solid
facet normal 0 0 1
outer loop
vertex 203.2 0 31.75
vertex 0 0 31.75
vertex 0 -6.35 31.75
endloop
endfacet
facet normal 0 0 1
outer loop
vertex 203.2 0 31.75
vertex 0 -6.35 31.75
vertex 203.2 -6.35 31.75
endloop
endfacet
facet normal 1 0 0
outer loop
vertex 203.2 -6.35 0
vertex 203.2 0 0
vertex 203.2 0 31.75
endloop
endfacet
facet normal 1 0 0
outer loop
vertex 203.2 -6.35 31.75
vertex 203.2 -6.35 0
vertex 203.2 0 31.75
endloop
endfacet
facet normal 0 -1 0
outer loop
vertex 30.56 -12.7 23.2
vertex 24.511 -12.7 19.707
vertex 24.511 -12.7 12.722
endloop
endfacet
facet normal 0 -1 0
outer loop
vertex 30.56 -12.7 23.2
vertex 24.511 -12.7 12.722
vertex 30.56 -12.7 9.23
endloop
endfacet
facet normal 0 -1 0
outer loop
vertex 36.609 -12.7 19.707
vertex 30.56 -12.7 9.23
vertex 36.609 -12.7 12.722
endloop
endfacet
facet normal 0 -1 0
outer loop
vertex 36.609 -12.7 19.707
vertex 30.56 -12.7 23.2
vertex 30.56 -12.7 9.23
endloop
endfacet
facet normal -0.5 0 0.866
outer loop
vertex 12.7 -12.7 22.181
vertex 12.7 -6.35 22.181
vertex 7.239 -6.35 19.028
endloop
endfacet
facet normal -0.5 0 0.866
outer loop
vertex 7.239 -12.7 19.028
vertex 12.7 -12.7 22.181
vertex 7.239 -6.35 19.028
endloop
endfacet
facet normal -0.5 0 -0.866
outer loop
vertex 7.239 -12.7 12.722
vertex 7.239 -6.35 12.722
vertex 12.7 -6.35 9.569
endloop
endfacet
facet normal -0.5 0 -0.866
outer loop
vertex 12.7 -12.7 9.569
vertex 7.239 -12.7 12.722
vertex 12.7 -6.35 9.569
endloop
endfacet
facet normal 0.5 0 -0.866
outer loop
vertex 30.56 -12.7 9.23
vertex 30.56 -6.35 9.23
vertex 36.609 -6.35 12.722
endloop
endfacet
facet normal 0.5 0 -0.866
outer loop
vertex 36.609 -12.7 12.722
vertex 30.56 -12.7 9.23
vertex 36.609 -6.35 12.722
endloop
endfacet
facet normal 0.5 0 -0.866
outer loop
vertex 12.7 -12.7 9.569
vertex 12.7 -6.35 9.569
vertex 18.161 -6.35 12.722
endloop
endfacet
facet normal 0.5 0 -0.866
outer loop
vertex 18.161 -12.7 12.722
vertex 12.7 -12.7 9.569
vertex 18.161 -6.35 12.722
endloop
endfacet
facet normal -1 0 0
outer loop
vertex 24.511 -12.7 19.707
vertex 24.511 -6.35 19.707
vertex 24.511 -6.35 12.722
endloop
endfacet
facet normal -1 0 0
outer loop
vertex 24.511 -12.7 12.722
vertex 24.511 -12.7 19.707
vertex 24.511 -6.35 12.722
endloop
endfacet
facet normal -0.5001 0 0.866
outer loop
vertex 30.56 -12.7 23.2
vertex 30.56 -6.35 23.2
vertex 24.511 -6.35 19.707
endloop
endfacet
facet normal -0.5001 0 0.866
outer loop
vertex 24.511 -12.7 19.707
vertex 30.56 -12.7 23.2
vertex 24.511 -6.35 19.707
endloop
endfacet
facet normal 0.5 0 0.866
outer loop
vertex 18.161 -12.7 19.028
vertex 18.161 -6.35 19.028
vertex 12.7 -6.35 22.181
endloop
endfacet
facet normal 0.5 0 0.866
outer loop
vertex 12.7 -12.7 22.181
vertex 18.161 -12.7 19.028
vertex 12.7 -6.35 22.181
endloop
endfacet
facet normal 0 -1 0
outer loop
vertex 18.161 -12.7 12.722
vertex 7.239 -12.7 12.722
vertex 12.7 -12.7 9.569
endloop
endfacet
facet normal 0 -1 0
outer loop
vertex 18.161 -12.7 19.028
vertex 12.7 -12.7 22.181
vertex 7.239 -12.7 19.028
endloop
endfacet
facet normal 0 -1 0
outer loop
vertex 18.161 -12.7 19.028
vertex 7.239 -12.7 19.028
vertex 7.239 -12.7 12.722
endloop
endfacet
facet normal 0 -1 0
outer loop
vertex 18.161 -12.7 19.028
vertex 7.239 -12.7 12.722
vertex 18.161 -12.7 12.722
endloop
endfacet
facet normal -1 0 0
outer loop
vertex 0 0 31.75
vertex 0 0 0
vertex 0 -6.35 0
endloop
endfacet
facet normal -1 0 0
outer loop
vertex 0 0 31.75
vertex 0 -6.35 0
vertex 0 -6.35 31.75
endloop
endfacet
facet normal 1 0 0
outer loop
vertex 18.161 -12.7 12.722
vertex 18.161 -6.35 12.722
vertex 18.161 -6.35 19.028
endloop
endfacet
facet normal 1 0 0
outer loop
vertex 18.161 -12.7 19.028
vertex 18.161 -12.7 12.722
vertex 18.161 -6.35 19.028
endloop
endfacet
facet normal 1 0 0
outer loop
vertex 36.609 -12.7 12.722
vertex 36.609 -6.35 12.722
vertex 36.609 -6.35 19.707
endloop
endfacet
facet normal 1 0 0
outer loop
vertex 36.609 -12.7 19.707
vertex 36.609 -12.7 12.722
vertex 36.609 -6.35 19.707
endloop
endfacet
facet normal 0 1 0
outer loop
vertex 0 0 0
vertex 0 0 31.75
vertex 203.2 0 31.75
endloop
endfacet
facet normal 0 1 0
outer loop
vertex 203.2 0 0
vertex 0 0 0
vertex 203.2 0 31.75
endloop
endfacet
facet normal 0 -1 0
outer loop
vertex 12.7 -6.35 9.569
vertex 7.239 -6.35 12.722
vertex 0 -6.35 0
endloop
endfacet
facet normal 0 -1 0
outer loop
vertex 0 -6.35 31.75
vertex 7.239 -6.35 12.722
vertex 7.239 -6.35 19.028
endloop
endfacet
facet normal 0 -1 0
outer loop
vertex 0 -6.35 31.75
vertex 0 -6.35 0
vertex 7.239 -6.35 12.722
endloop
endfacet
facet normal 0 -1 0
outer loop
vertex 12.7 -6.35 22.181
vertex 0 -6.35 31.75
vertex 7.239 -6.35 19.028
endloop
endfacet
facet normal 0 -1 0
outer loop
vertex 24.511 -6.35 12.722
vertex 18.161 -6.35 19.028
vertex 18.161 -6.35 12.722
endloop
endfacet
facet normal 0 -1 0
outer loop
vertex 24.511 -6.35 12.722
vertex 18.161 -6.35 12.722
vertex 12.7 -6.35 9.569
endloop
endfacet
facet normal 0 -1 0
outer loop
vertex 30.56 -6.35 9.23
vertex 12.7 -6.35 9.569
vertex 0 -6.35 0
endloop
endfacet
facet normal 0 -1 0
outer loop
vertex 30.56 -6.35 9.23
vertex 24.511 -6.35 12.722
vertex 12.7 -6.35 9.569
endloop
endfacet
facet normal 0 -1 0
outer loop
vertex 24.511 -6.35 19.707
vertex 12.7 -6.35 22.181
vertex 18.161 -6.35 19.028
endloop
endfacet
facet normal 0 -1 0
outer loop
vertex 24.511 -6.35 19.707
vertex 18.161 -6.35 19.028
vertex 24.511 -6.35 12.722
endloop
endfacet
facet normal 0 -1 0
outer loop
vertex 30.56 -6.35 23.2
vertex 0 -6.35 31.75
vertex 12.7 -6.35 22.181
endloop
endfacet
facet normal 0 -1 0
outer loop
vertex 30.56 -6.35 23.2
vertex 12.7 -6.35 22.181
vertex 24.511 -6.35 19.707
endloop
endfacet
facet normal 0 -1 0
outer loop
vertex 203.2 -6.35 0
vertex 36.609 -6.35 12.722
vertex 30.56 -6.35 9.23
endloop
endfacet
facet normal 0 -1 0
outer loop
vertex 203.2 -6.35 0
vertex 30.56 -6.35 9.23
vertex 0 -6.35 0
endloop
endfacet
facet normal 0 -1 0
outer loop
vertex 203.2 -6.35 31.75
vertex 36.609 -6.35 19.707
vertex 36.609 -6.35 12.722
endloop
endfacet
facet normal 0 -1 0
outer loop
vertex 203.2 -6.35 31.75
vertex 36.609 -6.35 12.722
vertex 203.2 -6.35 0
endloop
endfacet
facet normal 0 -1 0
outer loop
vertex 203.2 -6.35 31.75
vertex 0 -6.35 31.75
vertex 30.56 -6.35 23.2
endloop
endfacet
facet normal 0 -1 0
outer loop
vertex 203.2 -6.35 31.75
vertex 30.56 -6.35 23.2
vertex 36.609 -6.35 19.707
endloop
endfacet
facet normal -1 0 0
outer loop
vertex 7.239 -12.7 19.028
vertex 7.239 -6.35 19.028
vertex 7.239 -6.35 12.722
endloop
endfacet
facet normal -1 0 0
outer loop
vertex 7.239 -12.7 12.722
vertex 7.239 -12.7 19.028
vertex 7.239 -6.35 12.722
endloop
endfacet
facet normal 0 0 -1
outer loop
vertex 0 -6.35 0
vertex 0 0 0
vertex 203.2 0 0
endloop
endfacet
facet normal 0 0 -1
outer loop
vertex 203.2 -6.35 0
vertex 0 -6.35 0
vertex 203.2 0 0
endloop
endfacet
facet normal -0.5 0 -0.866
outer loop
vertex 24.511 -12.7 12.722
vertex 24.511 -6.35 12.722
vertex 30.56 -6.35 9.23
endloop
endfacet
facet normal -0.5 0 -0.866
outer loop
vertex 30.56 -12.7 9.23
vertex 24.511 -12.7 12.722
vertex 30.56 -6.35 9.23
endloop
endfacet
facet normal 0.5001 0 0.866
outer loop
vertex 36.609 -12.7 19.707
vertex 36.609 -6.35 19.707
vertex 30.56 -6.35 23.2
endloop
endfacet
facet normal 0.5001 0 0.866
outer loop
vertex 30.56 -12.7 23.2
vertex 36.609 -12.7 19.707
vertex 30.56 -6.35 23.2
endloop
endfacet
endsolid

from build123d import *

# Parameters (mm, degrees)
F0_W     = 203.2
F0_H     = 31.75
F1_DEPTH = 6.35
F3_DEPTH = 6.35
F5_DEPTH = 6.35


with BuildPart() as f1:
    # F0 (on Front) → F1 (new body)
    with BuildSketch(Plane.XZ):
        with Locations((101.6, 15.875)):
            Rectangle(F0_W, F0_H)
    extrude(amount=F1_DEPTH)

    # F2 (on face) → F3 (join)
    with BuildSketch(Plane.XZ.offset(6.35)):
        Polygon((18.160766, 12.722225), (18.160766, 19.027775), (12.7, 22.18055), (7.239234, 19.027775), (7.239234, 12.722225), (12.7, 9.56945), align=None)
    extrude(amount=F3_DEPTH)

    # F4 (on face) → F5 (join)
    with BuildSketch(Plane.XZ.offset(6.35)):
        Polygon((36.609141, 12.722225), (36.609141, 19.707225), (30.559954, 23.199725), (24.510766, 19.707225), (24.510766, 12.722225), (30.559954, 9.229725), align=None)
    extrude(amount=F5_DEPTH)


solid = f1.part
